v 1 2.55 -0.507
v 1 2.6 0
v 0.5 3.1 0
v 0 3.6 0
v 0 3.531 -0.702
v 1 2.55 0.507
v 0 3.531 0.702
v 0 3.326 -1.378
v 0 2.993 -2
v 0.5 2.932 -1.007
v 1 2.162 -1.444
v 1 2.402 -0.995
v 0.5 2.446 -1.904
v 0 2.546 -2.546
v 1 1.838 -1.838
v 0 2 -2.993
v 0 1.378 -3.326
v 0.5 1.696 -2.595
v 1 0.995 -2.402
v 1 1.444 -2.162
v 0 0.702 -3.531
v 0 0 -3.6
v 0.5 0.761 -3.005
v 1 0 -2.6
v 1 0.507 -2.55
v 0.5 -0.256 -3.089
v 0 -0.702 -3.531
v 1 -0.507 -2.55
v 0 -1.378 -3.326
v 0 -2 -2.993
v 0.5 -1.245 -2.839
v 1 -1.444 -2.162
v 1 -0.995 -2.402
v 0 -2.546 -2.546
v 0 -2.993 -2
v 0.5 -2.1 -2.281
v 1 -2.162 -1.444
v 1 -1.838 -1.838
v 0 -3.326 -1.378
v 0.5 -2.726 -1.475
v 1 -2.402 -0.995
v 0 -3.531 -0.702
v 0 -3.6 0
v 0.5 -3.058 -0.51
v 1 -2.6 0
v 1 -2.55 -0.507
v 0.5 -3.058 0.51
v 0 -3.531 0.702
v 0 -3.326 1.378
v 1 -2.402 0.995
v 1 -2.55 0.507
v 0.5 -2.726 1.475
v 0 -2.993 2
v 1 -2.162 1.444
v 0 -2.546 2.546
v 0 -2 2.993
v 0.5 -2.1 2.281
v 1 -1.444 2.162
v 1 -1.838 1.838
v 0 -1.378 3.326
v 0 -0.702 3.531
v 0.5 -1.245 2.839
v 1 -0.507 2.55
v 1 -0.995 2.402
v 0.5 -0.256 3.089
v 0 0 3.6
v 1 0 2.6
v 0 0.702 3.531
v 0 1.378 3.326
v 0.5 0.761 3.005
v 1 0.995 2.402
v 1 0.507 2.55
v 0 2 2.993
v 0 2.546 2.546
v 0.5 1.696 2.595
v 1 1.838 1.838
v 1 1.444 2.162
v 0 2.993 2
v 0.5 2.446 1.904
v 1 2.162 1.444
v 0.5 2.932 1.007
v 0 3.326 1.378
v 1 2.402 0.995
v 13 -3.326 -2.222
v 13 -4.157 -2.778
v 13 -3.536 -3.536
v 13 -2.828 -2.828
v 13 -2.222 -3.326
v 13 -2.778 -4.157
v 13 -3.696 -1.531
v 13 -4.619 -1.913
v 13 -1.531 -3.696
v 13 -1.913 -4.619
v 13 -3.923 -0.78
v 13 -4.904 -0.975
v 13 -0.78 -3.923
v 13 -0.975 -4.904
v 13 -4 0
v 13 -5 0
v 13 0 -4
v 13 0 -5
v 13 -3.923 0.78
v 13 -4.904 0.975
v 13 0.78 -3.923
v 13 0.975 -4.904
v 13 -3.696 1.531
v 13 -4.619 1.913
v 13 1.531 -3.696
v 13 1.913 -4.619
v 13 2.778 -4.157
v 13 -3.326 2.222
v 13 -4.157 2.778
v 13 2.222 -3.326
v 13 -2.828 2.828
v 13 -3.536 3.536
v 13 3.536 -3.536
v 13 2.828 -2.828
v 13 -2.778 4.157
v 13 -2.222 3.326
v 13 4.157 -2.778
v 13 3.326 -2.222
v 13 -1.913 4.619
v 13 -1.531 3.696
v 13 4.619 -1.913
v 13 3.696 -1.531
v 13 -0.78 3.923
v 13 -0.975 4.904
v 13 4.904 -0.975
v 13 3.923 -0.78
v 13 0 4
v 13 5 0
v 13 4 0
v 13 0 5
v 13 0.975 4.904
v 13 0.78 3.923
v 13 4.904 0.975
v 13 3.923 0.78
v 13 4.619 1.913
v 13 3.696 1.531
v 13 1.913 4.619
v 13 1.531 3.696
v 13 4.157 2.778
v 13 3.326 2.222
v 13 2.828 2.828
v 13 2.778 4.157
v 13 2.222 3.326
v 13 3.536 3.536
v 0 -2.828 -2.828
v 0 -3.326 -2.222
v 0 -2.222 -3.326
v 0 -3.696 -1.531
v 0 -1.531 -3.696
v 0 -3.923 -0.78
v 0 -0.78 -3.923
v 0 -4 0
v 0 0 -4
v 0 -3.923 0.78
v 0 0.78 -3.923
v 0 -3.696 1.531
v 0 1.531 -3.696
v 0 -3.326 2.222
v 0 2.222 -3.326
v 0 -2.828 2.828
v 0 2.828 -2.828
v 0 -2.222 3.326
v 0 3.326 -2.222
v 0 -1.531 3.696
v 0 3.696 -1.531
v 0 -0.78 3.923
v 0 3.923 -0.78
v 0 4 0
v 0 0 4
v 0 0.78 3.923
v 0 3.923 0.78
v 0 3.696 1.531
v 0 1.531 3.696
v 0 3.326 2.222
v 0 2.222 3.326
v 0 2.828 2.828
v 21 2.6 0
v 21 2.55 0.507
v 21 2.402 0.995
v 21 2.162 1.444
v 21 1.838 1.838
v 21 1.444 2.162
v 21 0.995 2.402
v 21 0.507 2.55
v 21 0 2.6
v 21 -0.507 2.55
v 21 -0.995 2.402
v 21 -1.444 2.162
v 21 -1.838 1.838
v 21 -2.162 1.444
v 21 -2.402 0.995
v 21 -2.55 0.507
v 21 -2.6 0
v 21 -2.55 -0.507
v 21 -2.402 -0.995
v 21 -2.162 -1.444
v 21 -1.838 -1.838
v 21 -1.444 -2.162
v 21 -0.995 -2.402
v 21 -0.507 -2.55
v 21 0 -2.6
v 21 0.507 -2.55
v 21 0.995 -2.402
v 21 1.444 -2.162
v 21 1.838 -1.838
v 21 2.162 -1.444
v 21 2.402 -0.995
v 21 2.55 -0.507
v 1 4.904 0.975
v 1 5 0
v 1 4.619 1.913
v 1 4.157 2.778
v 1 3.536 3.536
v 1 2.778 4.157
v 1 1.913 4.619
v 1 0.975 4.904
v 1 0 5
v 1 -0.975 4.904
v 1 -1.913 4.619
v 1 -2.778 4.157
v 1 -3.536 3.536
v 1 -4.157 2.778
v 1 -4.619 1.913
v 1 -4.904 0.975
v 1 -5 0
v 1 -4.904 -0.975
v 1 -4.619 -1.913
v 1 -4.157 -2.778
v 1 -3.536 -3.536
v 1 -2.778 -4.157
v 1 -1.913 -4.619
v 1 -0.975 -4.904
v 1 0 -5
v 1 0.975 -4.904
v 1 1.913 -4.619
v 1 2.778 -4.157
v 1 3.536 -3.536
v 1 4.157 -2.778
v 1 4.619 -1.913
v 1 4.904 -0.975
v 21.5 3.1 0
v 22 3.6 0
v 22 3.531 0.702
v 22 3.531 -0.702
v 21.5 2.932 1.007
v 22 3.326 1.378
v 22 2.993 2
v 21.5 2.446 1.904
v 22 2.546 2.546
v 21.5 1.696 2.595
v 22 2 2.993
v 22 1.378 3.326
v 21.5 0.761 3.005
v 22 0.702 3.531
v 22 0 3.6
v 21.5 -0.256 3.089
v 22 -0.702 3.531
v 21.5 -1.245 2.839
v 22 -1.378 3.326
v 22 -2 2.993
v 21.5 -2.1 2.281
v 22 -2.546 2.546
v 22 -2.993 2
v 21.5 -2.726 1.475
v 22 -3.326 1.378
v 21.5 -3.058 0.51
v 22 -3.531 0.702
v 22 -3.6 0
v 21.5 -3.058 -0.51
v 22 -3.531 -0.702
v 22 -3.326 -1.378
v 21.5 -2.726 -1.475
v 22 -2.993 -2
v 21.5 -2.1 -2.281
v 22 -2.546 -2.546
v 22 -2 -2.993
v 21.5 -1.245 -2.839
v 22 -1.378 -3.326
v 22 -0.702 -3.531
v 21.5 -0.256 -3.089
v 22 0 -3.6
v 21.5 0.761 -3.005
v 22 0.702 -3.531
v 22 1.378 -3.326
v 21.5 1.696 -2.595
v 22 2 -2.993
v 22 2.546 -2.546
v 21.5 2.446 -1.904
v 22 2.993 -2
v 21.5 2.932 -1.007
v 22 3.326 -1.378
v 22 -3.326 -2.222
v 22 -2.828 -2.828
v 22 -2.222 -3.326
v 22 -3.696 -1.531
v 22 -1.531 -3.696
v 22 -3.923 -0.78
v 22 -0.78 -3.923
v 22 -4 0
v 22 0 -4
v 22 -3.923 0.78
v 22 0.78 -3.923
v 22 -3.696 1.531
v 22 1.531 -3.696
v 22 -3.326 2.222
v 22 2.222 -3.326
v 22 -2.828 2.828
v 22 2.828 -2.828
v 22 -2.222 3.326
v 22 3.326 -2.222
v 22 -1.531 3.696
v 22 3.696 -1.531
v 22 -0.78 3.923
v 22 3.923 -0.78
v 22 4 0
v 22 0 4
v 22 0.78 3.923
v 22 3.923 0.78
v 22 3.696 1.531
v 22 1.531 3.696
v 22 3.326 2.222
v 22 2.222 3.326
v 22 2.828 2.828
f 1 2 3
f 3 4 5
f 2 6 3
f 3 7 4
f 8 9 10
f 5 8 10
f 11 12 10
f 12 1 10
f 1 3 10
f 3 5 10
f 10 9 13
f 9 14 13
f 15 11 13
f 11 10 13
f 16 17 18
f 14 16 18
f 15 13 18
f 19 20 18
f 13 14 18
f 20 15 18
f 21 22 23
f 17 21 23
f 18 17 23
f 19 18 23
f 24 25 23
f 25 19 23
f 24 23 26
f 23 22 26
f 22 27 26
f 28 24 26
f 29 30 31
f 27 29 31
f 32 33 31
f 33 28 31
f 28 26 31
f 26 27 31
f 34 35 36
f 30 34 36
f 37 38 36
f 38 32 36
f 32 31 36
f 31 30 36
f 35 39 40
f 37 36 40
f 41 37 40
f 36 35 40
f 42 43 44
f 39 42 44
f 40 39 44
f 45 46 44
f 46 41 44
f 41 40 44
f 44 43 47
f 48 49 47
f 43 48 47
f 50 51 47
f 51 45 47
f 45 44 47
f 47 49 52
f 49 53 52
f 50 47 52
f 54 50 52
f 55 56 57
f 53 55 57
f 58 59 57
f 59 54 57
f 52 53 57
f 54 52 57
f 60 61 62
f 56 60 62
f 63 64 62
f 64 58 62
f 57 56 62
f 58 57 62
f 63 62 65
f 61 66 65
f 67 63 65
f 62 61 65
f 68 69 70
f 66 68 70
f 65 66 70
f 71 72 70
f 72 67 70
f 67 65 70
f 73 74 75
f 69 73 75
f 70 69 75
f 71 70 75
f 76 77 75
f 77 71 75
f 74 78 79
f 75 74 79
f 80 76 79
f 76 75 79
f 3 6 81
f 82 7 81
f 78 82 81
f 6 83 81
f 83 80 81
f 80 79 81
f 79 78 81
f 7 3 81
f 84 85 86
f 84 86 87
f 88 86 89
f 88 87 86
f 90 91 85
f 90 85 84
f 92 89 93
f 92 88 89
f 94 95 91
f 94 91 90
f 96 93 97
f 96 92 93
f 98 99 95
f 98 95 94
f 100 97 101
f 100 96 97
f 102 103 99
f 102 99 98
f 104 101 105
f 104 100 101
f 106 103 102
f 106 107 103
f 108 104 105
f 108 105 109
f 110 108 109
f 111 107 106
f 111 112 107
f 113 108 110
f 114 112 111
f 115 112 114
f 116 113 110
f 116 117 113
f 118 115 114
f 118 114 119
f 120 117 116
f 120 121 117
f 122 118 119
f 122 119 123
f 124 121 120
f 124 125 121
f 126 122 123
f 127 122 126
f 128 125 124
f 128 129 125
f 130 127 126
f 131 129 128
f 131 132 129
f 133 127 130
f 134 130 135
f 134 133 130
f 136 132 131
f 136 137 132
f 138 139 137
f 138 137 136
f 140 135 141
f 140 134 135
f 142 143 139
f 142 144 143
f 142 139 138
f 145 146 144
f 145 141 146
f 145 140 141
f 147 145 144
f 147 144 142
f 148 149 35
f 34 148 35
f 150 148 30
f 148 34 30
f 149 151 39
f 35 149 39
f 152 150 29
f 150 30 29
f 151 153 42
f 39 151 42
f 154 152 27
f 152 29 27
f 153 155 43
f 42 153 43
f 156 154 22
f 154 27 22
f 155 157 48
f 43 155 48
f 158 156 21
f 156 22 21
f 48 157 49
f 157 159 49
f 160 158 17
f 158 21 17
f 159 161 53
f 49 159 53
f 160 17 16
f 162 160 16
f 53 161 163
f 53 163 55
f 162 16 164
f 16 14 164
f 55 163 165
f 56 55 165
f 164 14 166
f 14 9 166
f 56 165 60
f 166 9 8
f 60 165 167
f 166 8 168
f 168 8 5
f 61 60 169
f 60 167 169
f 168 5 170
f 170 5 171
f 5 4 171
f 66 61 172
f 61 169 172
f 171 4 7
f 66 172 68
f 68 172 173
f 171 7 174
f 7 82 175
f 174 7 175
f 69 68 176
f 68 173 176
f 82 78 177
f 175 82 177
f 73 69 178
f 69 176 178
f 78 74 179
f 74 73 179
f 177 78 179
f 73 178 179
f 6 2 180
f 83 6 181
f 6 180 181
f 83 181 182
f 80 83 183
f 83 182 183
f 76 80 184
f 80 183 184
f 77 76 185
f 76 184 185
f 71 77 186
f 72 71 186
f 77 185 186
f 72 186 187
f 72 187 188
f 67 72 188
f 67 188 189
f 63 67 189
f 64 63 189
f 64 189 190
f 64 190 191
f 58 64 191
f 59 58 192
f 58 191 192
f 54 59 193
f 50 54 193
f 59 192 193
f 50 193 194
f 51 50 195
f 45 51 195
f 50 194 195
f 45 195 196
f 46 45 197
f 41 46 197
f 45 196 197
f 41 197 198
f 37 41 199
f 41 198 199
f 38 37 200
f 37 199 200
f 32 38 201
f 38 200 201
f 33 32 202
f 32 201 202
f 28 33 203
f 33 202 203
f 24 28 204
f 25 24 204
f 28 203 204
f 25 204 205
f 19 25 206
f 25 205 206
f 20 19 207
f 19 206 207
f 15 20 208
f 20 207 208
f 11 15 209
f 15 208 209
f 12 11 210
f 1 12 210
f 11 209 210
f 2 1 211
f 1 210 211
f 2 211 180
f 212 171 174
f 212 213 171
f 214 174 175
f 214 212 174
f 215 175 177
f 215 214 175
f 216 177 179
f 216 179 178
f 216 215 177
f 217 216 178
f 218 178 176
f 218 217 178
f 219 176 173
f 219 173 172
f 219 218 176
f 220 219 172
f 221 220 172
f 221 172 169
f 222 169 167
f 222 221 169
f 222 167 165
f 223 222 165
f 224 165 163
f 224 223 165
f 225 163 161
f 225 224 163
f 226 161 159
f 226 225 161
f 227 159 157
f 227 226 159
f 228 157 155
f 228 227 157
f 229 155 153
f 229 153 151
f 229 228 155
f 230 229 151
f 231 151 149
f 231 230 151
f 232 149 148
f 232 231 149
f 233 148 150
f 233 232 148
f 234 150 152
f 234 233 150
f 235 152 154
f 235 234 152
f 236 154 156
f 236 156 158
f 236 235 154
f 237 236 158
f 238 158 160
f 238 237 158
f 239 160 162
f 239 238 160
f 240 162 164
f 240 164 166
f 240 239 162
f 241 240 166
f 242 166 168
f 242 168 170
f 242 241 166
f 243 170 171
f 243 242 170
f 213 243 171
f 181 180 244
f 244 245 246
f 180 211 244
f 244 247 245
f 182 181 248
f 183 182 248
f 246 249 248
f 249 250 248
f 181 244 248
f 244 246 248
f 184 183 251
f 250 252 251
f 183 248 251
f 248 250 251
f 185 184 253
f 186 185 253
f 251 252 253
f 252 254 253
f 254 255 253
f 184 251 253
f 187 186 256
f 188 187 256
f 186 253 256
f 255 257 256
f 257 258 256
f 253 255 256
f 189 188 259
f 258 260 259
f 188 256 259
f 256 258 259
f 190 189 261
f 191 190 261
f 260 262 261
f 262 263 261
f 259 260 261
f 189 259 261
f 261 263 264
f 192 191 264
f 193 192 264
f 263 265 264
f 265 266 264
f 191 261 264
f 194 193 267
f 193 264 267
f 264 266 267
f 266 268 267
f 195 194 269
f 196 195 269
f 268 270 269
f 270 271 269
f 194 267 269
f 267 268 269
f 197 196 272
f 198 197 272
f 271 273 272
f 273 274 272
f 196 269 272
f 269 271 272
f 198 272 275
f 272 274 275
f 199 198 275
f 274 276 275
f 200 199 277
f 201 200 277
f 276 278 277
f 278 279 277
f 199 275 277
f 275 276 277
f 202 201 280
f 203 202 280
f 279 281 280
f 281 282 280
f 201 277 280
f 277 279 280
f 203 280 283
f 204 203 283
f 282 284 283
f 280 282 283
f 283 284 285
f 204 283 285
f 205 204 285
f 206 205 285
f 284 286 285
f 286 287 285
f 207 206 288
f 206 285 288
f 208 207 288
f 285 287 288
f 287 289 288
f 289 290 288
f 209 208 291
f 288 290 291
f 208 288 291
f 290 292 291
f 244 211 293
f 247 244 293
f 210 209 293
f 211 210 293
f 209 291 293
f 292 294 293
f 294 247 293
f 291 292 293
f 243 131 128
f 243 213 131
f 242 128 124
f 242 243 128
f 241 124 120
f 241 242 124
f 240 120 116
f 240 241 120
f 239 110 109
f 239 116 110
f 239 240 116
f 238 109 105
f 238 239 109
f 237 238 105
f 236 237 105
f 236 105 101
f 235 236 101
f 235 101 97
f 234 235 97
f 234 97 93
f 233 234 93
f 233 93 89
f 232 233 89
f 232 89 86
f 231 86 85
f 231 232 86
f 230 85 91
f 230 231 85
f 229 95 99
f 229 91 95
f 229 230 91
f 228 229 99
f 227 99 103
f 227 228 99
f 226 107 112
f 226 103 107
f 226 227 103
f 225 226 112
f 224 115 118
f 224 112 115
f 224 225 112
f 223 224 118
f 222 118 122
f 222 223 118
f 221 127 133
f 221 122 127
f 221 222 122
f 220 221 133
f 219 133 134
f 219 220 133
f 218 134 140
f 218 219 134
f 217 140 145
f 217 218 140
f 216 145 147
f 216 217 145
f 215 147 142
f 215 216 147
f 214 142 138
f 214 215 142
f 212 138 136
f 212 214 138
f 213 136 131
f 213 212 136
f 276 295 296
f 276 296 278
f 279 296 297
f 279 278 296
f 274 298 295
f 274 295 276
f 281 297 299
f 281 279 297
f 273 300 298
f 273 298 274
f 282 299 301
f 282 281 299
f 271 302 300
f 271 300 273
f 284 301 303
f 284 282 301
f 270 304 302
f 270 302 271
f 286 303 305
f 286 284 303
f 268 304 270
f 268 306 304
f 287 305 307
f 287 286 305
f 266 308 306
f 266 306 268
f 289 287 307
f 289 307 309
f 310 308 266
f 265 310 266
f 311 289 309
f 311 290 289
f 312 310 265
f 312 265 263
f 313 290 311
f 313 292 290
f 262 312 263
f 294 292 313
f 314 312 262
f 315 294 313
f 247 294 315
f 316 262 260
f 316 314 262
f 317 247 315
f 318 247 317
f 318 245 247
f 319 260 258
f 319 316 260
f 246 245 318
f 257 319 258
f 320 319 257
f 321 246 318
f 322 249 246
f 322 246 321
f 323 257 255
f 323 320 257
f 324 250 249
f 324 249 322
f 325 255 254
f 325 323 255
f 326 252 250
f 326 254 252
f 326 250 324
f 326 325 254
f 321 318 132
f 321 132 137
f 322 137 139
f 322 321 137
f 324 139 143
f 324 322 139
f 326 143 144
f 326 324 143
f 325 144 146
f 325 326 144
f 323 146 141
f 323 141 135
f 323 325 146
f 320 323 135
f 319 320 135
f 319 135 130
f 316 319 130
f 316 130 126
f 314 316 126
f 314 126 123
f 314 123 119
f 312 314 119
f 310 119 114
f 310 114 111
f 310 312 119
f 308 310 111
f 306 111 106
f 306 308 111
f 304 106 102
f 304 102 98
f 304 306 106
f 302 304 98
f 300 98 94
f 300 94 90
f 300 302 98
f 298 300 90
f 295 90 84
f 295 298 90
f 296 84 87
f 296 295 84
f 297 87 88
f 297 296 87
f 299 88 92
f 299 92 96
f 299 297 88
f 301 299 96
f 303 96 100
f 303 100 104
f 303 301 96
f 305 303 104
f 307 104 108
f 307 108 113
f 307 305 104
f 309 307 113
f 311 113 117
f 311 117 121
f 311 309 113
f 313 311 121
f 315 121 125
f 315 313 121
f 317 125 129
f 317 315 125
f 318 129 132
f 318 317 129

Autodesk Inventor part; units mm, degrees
ref_plane "YZ Plane" through (0, 0, 0) normal (1, 0, 0) x (0, 1, 0)
ref_plane "XZ Plane" through (0, 0, 0) normal (0, 1, 0) x (-1, 0, 0)
ref_plane "XY Plane" through (0, 0, 0) normal (0, 0, 1) x (1, 0, 0)
sketch "Sketch1" plane through (0, 0, 0) normal (0, 0, 1) x (1, 0, 0)
  line L0 (0, 0) -> (22, 0)
  line L1 (22, 0) -> (22, 5)
  line L2 (22, 5) -> (0, 5)
  line L3 (0, 5) -> (0, 0)
  line L4 (22, 0) -> (13, 0)
  line L5 (13, 0) -> (13, 4)
  line L6 (13, 4) -> (22, 4)
  line L7 (22, 4) -> (22, 0)
  line L8 (13, 4) -> (13, 5)
  line L9 (22, 0) -> (0, 0)
  line L10 (0, 0) -> (0, 2.6)
  line L11 (0, 2.6) -> (22, 2.6)
  line L12 (22, 2.6) -> (22, 0)
  dimension "d0" = 22
  dimension "d1" = 5
  dimension "d2" = 9
  dimension "d3" = 4
  dimension "d4" = 2.6
revolve "Revolution1" add sketch "Sketch1" angle 360 about axis through (0, 0, 0) along (1, 0, 0) contours L3 L2 L8 L5 L11 | L5 L6 L1 L11
chamfer "Chamfer1" distance 1 angle 45 3 edges at (22, -2.6, 0) (0, -2.6, 0) (0, -5, 0)
properties part number "Vezetőhüvely"
